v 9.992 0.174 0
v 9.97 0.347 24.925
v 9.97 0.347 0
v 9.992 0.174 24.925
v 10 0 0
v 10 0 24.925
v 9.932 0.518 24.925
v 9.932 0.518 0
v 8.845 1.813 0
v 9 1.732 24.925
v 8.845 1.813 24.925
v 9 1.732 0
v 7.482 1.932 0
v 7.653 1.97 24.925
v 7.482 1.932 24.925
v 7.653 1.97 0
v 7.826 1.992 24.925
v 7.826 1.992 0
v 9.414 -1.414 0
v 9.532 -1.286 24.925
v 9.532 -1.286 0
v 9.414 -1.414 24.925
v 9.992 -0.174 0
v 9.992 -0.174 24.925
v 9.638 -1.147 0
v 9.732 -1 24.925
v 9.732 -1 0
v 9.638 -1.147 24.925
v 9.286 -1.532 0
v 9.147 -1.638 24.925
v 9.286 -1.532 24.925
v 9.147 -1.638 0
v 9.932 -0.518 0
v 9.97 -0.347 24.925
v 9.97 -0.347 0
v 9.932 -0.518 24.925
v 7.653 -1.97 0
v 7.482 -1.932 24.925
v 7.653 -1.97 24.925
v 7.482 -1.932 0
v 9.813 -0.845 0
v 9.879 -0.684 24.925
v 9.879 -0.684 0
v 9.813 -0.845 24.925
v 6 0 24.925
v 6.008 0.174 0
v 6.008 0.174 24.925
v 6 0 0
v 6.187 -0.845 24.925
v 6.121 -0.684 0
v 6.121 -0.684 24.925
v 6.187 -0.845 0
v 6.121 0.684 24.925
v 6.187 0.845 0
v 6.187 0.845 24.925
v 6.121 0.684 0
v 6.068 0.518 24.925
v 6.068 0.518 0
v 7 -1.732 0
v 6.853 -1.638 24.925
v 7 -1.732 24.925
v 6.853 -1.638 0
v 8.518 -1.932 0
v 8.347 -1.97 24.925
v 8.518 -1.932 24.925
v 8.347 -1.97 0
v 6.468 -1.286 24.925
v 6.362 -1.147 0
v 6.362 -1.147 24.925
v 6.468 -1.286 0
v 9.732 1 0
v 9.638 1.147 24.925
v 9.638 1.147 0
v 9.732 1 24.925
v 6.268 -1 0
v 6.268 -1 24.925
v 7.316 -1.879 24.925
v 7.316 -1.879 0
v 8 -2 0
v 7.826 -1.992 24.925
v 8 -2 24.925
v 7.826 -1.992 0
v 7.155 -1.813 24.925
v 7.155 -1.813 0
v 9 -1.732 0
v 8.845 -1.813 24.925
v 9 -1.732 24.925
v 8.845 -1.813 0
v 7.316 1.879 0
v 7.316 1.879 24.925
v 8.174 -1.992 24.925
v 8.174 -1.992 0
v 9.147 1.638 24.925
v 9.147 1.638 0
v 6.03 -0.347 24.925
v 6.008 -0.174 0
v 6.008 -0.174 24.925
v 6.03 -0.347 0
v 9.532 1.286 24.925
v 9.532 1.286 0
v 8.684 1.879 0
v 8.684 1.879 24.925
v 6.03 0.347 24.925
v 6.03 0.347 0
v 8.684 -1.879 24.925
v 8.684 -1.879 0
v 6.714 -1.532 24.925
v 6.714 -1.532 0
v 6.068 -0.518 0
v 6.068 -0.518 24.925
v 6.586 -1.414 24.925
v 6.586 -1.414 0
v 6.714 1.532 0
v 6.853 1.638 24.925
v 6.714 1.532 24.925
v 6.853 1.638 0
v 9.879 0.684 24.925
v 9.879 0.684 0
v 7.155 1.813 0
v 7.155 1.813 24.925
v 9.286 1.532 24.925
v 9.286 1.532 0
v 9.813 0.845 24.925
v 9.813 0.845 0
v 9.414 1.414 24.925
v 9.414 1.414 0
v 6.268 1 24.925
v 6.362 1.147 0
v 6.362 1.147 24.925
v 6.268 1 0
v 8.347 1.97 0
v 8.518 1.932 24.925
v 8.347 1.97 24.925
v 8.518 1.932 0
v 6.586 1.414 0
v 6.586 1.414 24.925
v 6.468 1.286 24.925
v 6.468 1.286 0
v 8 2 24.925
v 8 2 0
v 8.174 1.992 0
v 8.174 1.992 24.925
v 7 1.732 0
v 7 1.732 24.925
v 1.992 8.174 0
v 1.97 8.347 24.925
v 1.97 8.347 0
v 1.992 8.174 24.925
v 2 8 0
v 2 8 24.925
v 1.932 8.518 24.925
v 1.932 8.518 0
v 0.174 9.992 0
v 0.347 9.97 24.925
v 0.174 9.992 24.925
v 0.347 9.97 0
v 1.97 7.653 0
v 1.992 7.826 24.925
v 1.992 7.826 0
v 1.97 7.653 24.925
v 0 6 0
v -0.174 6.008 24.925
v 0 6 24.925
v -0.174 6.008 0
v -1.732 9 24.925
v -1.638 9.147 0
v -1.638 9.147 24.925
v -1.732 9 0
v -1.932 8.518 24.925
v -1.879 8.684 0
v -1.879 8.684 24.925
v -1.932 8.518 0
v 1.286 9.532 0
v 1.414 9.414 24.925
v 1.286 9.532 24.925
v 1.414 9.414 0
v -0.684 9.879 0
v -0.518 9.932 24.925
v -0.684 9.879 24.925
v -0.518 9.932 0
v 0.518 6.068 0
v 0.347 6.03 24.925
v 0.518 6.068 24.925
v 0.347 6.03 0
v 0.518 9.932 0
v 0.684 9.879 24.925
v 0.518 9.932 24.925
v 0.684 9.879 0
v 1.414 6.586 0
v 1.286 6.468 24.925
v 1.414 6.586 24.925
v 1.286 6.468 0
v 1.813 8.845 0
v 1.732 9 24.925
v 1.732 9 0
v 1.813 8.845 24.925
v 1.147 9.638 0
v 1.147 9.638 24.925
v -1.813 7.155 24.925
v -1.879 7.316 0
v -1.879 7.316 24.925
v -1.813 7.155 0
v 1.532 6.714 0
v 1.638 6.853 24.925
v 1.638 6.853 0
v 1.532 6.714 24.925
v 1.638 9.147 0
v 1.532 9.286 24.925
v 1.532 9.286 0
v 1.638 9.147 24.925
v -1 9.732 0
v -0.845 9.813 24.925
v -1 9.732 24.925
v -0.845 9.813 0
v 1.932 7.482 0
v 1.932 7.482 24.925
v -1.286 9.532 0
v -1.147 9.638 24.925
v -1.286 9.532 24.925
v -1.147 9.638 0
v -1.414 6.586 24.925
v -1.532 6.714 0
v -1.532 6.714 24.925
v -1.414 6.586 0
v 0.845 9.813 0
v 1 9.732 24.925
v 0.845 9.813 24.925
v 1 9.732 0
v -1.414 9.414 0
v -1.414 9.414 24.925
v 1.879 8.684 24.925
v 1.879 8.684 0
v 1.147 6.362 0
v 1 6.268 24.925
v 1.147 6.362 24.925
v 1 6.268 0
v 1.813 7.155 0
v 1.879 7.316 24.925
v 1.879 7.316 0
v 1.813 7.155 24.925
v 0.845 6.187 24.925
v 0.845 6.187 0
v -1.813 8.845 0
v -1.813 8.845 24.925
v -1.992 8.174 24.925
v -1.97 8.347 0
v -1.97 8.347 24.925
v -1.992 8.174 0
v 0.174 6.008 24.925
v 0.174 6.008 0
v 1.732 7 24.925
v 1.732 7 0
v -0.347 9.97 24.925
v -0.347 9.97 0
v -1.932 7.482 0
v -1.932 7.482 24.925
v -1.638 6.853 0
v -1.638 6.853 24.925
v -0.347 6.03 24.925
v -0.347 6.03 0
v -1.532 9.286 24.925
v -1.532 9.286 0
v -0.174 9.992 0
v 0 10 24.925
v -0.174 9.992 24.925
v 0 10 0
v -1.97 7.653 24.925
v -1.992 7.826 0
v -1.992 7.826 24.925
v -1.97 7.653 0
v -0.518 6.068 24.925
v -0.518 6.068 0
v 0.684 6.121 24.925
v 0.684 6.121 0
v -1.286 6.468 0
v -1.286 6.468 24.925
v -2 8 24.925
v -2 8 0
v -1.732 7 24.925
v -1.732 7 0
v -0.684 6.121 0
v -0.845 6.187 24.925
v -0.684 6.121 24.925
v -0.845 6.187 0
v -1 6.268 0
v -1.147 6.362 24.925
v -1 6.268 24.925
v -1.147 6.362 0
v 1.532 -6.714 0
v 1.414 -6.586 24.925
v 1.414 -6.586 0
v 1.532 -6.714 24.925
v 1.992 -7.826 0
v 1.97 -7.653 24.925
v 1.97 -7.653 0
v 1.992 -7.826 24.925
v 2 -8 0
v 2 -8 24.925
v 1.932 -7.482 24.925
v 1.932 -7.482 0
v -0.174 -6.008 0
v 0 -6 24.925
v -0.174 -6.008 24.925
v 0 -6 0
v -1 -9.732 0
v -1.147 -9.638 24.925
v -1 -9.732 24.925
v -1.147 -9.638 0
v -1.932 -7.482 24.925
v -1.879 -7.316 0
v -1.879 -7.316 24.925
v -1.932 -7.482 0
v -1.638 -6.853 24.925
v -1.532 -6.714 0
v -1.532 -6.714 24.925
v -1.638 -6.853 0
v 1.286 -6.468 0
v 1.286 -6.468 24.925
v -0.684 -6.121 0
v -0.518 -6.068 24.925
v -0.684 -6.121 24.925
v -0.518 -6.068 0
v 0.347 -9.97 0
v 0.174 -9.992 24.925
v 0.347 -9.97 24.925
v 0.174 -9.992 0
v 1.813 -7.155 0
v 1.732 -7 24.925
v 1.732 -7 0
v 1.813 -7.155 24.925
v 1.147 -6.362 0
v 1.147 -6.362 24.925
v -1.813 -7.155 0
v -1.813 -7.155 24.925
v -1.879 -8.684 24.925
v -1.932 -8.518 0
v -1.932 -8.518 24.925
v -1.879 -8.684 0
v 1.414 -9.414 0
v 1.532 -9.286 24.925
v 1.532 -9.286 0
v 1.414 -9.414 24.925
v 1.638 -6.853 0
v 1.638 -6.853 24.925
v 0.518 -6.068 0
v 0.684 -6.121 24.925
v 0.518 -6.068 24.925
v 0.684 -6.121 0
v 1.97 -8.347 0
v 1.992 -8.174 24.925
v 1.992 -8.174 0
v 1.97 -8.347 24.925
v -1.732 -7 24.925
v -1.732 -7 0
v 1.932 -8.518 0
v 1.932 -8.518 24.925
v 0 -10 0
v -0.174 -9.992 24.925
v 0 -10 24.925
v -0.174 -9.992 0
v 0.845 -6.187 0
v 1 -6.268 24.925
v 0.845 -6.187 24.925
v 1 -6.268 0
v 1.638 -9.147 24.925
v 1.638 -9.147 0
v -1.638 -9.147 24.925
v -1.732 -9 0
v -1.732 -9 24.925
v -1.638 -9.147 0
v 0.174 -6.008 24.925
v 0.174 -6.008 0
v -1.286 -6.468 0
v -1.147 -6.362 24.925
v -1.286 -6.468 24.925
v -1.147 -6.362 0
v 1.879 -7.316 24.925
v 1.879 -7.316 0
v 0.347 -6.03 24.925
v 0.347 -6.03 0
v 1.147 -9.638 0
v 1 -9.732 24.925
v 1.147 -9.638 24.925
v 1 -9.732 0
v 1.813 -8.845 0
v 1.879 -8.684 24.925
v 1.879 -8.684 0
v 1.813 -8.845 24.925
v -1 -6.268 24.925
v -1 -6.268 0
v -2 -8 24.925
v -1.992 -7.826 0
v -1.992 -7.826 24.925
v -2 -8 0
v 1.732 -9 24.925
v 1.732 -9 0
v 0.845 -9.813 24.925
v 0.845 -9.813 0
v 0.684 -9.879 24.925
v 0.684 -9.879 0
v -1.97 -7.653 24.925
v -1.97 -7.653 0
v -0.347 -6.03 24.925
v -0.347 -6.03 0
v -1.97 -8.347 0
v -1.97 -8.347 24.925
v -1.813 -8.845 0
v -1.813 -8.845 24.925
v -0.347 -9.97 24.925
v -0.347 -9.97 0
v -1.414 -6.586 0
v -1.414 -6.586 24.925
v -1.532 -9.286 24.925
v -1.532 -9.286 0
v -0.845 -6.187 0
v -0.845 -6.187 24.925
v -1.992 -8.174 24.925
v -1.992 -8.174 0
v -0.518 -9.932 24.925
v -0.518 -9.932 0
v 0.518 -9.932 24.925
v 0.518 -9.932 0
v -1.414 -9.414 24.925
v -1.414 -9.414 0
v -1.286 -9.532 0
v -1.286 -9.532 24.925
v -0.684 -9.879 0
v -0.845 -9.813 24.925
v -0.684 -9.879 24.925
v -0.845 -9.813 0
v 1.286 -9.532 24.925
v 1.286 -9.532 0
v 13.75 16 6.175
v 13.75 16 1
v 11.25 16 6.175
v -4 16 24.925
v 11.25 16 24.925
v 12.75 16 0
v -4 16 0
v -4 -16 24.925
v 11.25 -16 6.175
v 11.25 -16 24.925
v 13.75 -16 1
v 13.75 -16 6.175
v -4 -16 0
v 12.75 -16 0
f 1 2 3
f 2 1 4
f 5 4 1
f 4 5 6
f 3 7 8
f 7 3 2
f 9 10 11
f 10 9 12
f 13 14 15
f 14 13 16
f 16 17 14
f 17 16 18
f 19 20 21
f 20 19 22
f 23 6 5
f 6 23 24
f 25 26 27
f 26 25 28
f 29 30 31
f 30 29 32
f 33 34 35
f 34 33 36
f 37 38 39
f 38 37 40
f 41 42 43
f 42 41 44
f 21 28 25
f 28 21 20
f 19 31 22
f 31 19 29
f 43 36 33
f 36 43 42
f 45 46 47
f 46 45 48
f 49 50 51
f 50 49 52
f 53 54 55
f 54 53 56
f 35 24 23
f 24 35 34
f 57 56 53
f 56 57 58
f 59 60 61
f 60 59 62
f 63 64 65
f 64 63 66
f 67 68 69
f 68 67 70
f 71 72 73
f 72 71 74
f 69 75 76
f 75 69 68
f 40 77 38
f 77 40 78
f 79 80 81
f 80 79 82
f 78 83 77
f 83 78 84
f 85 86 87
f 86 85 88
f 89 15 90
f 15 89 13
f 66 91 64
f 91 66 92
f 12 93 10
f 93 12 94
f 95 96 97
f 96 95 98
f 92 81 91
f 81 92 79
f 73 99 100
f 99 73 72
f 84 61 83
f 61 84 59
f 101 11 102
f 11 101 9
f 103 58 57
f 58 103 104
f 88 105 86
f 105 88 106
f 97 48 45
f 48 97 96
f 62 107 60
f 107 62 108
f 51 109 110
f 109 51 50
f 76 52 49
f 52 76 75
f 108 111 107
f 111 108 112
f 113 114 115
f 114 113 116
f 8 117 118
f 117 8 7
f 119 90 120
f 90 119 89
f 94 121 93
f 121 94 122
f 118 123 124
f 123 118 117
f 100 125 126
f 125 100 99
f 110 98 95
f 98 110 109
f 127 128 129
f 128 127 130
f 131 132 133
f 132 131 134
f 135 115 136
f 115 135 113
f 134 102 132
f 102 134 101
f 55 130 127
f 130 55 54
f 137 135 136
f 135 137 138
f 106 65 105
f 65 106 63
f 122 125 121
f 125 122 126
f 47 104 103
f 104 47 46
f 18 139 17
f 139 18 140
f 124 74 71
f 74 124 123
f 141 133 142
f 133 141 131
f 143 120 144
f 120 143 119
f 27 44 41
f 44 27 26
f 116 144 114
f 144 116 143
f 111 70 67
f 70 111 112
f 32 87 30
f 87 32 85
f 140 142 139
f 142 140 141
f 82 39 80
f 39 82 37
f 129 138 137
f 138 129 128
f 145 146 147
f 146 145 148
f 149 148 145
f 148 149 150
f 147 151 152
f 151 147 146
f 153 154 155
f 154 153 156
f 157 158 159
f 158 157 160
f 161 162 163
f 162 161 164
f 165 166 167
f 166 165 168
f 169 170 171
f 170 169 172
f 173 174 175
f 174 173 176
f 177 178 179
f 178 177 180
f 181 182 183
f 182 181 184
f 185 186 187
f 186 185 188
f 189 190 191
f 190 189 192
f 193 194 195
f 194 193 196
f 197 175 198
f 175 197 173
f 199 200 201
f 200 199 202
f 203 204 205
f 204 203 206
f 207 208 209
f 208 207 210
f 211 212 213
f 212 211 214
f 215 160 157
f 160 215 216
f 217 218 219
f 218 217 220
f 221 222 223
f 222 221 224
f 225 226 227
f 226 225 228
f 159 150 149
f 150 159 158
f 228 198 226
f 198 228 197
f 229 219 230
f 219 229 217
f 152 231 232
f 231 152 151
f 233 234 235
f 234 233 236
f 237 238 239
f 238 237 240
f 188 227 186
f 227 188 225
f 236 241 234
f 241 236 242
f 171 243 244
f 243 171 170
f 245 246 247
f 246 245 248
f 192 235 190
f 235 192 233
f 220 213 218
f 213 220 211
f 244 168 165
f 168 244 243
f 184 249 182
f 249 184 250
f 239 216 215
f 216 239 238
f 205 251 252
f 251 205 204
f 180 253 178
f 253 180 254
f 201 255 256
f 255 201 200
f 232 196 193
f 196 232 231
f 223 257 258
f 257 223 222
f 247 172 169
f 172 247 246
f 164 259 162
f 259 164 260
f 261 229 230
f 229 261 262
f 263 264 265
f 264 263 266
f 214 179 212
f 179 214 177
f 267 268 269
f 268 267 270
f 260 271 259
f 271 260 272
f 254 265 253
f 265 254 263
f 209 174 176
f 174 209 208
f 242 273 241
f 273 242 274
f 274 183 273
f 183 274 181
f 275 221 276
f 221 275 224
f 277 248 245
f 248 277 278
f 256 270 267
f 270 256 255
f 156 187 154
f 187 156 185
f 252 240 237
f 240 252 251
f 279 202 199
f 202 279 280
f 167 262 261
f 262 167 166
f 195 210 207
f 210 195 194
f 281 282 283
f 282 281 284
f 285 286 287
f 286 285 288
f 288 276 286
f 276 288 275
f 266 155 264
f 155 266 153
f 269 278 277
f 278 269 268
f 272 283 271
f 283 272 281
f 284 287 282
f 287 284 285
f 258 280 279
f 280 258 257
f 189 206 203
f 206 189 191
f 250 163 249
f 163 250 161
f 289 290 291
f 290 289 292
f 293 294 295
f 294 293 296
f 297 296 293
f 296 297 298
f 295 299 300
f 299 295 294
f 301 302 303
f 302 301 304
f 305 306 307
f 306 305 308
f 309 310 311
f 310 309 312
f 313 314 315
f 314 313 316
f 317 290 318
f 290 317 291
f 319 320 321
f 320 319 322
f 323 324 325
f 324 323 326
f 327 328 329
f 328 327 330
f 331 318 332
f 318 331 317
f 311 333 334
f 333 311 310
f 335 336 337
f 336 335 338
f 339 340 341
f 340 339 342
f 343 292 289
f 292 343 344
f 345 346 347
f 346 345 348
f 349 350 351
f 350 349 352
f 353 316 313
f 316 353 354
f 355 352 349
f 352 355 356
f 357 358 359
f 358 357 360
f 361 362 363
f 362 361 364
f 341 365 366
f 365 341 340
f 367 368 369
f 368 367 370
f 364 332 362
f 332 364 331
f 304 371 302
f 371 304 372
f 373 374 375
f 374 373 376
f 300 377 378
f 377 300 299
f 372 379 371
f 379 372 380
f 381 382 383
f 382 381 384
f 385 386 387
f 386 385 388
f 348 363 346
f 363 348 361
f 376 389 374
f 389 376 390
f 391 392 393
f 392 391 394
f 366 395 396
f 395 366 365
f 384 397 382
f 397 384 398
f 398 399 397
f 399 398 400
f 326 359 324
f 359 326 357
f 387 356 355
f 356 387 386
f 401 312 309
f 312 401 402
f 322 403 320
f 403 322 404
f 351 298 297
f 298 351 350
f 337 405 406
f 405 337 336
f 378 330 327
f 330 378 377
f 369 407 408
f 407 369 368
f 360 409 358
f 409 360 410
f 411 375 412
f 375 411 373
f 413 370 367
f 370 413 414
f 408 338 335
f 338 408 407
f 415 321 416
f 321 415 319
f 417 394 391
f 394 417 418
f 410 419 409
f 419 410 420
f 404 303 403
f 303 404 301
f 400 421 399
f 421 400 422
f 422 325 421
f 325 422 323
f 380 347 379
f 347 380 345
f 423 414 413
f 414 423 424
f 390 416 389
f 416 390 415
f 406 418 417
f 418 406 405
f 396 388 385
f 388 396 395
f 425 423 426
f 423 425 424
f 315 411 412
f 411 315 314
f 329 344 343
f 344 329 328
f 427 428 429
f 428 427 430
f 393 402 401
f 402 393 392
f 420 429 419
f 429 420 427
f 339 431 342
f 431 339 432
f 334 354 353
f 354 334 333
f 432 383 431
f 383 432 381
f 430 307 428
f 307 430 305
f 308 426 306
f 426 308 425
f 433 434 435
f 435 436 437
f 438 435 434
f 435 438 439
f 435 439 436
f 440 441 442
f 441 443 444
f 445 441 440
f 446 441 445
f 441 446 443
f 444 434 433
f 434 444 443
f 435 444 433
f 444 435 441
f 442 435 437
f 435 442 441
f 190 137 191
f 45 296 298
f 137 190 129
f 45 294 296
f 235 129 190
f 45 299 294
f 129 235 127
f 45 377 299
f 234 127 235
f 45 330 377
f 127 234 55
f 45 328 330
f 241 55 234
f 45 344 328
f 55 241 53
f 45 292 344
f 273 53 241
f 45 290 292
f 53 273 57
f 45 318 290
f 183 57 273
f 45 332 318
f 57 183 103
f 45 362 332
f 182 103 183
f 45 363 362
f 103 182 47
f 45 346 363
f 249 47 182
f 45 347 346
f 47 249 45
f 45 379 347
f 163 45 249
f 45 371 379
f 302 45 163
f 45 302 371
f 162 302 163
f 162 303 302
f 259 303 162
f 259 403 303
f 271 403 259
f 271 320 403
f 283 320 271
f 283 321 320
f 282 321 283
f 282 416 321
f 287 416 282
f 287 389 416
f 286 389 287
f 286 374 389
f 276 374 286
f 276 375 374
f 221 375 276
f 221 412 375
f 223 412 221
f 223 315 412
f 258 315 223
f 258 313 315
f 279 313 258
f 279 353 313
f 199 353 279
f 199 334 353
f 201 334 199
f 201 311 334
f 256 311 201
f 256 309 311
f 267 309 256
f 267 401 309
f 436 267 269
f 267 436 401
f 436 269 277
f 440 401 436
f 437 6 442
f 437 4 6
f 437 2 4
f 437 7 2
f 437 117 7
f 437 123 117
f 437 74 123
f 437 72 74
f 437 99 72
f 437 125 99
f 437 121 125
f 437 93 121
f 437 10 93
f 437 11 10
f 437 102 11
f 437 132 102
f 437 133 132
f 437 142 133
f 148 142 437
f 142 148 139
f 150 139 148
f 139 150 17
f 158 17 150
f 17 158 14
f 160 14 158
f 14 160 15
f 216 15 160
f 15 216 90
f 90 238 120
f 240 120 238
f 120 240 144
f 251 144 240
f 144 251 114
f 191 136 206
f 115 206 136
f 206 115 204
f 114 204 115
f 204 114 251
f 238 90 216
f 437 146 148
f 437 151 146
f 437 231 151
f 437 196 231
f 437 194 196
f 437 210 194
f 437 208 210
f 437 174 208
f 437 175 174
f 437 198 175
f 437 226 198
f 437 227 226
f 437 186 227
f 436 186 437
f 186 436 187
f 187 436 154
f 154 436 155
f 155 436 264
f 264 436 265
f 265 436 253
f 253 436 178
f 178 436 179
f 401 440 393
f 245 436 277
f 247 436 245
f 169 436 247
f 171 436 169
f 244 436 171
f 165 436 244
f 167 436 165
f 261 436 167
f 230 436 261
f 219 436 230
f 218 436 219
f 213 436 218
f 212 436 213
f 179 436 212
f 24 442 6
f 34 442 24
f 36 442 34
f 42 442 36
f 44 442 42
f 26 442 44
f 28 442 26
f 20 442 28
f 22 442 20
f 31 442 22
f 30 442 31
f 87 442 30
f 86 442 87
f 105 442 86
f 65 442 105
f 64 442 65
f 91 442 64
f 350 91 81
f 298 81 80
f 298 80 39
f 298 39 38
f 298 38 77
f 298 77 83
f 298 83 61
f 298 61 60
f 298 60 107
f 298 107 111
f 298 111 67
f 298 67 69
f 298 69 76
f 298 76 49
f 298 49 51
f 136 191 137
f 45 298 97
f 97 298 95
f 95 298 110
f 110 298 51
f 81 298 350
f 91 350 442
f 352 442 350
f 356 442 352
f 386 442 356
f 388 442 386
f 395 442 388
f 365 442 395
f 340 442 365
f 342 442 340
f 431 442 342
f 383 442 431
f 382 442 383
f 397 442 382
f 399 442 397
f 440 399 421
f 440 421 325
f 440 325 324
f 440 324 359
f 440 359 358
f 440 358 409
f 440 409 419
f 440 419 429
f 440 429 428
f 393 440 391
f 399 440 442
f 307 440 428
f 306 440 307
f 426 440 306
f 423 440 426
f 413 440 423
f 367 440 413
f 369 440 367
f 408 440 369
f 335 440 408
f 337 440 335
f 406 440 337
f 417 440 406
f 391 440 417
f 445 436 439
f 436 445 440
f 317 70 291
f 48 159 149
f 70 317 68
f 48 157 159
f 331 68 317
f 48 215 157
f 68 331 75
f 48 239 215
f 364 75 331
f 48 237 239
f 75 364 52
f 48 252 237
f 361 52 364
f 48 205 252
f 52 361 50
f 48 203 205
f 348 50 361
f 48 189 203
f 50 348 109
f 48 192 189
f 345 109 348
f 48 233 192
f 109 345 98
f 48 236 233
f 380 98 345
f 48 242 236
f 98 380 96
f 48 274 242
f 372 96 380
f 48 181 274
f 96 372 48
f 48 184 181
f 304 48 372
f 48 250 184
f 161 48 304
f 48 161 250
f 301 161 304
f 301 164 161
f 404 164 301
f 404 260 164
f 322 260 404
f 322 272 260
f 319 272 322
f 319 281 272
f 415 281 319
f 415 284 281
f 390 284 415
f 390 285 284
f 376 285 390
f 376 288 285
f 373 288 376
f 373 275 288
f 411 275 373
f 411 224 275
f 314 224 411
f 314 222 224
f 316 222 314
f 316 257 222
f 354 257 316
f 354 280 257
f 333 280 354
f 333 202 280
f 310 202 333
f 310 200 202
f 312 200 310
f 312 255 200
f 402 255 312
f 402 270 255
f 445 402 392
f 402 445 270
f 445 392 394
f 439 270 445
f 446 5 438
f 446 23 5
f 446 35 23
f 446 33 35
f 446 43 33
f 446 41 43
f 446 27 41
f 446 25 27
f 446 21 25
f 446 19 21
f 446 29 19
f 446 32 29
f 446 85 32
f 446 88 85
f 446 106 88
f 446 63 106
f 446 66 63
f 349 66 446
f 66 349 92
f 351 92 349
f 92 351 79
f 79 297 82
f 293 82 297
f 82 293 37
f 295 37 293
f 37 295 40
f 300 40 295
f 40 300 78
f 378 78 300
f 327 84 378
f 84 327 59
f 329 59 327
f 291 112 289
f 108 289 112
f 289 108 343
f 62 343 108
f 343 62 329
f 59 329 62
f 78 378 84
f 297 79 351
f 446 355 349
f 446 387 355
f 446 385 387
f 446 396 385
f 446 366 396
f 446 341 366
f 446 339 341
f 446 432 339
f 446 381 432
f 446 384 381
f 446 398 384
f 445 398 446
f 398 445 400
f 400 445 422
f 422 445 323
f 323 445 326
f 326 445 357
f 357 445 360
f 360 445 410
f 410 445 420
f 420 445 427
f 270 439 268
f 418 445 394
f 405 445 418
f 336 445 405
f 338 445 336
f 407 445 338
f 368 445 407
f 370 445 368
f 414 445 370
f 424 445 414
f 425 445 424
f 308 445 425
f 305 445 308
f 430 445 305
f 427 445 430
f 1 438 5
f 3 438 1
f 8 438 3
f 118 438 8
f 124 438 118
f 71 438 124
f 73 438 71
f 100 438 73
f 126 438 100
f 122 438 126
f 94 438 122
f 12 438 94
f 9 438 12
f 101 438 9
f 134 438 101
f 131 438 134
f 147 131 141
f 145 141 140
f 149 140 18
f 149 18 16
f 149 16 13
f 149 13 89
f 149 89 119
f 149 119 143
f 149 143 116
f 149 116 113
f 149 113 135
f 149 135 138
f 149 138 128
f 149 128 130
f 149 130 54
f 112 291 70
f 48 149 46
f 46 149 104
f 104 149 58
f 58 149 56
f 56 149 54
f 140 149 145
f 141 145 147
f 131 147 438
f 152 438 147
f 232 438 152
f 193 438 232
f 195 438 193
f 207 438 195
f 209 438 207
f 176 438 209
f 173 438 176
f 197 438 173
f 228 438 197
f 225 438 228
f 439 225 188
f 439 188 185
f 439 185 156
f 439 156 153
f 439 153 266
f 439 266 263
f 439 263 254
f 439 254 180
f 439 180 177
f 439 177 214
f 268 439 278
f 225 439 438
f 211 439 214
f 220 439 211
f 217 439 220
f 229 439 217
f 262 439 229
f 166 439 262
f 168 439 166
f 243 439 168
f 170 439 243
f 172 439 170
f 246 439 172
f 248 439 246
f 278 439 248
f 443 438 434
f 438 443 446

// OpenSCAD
Length = 32;
ChannelWidth = 27.5;
Depth = 24.925;
Chamfer = 1;
InnerEdge = -4;

TrackSpacing = 12;
TrackWidth = 2.5;
TrackOffset = 6.175; // Previously 5.675
HoleOffset = 14;


$fn = 72;

difference() {
    rotate([90,0,0])
    linear_extrude(height=Length, center=true)
        polygon([[ChannelWidth/2, TrackOffset],
                 [ChannelWidth/2, Chamfer],
                 [ChannelWidth/2 - Chamfer, 0],
                 [InnerEdge, 0],
                 [InnerEdge, Depth],
                 [ChannelWidth/2 - TrackWidth, Depth],
                 [ChannelWidth/2 - TrackWidth, TrackOffset]]);
    
    union () {
        translate([8,0,-1])
            cylinder(r=2,h=Depth+2);
        translate([0,8,-1])
            cylinder(r=2,h=Depth+2);
        translate([0,-8,-1])
            cylinder(r=2,h=Depth+2);
    }
    
}
